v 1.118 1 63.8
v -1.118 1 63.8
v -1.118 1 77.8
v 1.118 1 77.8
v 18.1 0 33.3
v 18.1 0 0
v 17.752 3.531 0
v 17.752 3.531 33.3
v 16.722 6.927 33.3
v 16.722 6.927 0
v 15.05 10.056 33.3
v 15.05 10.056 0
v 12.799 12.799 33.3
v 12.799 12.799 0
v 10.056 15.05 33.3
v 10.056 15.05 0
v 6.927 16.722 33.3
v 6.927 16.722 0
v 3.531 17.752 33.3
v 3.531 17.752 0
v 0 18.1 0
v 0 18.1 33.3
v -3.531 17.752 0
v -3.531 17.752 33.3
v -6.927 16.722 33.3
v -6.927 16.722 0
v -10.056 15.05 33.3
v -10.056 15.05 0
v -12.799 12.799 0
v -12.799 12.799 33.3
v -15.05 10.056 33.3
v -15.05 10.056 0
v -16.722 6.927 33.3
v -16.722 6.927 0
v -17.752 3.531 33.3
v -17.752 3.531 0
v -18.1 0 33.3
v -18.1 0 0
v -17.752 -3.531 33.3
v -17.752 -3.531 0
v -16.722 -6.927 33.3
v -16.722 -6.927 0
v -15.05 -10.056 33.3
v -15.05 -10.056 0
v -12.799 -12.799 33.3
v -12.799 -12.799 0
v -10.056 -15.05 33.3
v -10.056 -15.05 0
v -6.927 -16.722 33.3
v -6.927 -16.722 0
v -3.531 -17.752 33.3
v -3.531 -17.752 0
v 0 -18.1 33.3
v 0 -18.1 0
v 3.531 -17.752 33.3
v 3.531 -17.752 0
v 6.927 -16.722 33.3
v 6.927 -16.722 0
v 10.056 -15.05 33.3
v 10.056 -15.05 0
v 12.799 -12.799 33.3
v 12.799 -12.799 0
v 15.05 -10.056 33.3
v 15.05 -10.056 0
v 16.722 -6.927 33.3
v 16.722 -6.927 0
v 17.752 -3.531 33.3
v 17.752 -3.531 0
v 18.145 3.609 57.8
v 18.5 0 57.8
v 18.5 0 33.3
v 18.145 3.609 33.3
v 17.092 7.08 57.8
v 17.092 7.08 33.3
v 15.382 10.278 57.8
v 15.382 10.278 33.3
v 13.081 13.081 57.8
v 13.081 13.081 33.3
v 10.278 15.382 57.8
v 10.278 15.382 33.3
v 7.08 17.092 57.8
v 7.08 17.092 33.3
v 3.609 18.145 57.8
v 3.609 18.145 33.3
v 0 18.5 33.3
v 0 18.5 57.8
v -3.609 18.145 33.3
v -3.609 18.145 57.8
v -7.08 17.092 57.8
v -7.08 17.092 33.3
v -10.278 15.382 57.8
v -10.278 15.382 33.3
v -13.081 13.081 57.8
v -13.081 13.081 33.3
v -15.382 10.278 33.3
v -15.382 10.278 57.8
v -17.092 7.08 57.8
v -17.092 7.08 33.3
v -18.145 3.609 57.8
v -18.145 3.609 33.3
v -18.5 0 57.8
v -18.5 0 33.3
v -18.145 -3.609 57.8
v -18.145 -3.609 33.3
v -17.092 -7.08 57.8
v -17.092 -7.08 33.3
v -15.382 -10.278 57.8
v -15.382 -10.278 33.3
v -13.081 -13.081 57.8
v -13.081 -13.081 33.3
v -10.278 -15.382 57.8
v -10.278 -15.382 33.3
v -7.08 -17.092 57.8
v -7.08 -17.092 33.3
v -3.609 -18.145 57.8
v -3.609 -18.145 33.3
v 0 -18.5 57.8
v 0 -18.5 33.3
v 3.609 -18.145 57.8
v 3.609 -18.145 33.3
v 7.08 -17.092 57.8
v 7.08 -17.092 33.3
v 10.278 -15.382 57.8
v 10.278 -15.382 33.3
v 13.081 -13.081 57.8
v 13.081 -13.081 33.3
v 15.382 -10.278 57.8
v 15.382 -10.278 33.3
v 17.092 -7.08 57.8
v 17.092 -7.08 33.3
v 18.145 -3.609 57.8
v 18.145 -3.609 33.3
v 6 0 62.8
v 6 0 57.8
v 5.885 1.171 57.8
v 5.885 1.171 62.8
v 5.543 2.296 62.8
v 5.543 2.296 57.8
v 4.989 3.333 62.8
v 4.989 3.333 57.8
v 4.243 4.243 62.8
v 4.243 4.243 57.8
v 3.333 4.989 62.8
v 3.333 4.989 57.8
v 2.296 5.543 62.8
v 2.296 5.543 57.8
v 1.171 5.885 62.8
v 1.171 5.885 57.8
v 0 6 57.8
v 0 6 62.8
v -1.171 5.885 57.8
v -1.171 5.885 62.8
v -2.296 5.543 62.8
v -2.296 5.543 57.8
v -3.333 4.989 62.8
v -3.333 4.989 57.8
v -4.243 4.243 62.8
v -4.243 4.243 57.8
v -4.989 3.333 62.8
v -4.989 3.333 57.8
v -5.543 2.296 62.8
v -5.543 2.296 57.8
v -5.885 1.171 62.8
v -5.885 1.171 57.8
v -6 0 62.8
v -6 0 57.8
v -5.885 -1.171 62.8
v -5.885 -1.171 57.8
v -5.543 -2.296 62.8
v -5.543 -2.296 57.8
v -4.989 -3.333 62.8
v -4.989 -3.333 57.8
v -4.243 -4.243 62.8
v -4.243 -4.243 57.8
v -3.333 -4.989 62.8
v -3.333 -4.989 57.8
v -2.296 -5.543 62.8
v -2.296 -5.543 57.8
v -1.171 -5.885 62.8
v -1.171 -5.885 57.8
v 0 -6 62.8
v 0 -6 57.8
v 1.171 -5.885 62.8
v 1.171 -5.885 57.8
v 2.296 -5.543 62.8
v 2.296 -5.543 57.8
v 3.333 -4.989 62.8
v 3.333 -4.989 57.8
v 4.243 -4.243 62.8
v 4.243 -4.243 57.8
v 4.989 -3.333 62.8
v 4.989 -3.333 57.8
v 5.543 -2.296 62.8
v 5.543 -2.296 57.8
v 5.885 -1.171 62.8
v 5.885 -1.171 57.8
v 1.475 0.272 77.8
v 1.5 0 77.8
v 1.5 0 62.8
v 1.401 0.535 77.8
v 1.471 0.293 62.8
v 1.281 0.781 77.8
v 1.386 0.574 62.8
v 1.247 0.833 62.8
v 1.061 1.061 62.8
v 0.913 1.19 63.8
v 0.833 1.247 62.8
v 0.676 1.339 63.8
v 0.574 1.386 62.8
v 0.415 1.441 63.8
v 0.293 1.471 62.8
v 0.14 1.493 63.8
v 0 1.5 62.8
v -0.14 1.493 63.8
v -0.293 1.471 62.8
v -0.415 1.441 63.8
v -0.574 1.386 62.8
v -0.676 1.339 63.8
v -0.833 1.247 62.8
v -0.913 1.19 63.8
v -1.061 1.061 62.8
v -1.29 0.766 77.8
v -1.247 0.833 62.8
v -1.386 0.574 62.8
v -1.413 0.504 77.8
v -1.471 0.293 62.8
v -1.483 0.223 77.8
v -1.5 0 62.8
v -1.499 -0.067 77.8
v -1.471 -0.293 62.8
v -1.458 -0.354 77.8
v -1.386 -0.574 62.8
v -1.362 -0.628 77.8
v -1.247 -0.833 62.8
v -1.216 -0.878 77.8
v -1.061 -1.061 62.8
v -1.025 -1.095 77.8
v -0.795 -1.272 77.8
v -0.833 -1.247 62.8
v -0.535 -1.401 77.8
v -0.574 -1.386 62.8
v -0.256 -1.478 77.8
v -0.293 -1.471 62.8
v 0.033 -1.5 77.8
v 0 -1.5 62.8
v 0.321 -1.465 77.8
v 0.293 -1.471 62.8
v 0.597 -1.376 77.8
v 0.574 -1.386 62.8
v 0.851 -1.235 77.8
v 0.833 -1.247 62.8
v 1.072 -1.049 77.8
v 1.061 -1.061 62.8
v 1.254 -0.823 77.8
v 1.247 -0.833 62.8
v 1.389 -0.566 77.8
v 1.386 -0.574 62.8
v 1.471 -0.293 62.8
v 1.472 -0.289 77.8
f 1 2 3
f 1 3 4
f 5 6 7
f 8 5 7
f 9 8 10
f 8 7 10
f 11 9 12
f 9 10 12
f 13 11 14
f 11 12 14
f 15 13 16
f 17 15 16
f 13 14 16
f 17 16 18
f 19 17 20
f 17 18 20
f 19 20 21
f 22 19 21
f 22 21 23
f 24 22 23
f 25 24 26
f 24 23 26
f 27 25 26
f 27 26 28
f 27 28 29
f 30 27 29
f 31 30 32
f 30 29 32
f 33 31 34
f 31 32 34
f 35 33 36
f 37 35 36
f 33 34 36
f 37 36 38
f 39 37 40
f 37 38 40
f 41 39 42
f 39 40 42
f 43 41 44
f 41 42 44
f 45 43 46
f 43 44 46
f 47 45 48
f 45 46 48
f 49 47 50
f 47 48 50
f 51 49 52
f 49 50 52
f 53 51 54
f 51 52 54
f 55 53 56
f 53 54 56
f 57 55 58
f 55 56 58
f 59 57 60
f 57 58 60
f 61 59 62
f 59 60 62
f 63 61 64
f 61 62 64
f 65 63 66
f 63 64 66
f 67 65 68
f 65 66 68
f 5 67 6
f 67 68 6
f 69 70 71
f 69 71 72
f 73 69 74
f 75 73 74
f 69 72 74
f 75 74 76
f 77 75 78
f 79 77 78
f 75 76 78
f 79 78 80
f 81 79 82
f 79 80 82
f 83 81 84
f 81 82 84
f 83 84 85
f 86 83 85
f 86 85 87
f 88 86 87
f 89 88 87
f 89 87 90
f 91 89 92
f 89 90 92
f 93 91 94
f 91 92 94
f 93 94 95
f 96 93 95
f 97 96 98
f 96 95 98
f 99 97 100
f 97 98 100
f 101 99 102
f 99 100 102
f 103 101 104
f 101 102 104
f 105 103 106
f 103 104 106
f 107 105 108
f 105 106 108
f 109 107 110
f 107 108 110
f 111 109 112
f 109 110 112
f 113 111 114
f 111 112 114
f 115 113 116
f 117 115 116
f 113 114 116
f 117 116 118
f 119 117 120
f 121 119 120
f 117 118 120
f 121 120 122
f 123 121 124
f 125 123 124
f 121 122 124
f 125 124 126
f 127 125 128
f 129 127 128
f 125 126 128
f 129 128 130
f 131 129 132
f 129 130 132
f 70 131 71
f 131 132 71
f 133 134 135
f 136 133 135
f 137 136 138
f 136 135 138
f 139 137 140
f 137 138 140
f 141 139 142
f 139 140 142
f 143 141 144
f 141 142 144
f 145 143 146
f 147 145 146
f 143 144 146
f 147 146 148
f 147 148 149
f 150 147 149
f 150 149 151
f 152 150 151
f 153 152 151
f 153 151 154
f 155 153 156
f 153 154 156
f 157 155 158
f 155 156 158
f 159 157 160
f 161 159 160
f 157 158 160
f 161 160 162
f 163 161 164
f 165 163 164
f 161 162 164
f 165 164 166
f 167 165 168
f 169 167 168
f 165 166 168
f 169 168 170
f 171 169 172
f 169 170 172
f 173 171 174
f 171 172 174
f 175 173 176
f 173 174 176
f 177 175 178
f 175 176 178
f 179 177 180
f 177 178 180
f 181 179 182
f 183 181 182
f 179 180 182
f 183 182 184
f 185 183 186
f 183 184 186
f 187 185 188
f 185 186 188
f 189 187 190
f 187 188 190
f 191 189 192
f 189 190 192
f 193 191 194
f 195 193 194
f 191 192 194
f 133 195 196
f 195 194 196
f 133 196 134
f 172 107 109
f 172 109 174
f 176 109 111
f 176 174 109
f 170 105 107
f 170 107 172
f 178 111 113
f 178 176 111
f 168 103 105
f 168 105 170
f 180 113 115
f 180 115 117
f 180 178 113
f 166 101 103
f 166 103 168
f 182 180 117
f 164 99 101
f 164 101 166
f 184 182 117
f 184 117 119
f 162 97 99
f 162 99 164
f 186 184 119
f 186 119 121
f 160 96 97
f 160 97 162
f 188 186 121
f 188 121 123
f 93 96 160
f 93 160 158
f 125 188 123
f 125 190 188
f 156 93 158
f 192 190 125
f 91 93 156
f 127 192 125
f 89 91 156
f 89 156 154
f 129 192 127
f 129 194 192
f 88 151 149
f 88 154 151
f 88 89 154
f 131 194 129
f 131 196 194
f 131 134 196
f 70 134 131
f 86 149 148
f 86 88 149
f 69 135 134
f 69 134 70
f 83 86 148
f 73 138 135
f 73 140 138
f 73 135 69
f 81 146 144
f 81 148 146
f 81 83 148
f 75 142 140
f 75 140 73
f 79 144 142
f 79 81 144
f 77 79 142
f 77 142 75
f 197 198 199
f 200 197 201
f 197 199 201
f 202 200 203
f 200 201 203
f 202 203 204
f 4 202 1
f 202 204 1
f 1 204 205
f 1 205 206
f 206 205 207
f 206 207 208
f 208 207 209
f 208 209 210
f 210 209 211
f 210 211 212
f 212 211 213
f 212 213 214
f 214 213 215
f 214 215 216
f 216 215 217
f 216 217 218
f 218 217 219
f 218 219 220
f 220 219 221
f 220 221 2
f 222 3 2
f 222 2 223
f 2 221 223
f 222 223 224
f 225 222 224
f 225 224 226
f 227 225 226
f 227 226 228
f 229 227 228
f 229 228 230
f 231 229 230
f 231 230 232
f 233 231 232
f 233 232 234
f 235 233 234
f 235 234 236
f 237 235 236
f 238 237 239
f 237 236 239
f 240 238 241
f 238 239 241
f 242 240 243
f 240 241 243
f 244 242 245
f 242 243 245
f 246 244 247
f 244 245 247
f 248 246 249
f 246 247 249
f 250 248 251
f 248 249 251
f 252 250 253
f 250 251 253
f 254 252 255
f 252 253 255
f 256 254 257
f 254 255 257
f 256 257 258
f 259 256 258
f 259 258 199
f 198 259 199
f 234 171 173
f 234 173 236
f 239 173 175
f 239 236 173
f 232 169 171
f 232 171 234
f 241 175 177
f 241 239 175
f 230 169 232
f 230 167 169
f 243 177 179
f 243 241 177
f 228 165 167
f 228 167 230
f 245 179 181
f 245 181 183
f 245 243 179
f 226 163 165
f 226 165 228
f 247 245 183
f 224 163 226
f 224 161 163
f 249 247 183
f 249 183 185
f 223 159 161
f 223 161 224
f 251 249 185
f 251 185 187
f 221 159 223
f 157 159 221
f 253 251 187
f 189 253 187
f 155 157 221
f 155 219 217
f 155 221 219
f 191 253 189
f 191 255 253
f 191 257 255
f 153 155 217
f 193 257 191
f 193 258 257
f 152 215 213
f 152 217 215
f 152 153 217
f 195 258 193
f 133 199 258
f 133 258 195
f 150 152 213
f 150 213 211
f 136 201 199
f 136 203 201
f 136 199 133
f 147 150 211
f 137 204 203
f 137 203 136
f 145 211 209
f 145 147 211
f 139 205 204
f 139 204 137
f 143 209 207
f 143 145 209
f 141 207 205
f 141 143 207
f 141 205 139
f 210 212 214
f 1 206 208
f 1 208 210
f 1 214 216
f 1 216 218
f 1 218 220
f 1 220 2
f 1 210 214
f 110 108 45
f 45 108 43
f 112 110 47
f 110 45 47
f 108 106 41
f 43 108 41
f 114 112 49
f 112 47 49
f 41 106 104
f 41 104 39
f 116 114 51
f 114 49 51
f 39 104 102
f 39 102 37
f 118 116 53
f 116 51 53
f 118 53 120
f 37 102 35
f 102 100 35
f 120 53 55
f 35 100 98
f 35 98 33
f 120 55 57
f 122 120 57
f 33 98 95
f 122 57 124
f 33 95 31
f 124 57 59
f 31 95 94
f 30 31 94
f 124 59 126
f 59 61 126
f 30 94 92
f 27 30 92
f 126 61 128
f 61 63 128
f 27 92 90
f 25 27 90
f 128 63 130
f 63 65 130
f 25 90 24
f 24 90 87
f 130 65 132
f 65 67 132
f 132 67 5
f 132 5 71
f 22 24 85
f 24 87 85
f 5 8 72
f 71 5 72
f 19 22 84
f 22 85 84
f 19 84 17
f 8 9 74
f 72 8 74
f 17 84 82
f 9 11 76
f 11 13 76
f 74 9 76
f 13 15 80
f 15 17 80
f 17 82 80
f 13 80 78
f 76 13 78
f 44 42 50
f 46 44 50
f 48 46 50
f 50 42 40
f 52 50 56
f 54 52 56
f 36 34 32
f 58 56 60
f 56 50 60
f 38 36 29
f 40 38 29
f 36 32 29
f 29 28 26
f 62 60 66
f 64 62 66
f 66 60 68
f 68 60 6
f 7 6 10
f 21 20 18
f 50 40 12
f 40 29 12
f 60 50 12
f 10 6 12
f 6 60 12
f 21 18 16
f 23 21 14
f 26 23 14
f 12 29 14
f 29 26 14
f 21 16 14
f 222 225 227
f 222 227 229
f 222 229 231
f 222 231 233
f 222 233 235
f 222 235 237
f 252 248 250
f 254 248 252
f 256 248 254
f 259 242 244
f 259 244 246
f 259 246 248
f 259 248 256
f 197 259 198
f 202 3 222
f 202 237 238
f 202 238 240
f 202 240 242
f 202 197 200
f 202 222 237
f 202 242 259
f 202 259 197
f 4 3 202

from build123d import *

# Parameters (mm, degrees)
SKETCH1_R           = 18.099999995
BOSS_EXTRUDE1_DEPTH = 33.3
SKETCH2_R           = 18.5
BOSS_EXTRUDE2_DEPTH = 24.5
SKETCH3_R           = 5.999999938
BOSS_EXTRUDE3_DEPTH = 5
SKETCH4_R           = 1.500000048
BOSS_EXTRUDE4_DEPTH = 15
CUT_EXTRUDE2_START  = -14
CUT_EXTRUDE2_DEPTH  = 14


with BuildPart() as part:
    # Sketch1 → Boss-Extrude1 (new body)
    with BuildSketch(Plane.XY):
        Circle(SKETCH1_R)
    extrude(amount=BOSS_EXTRUDE1_DEPTH)

    # Sketch2 → Boss-Extrude2 (add)
    with BuildSketch(Plane.XY.offset(33.3)):
        Circle(SKETCH2_R)
    extrude(amount=BOSS_EXTRUDE2_DEPTH)

    # Sketch3 → Boss-Extrude3 (add)
    with BuildSketch(Plane.XY.offset(57.8)):
        Circle(SKETCH3_R)
    extrude(amount=BOSS_EXTRUDE3_DEPTH)

    # Sketch4 → Boss-Extrude4 (add)
    with BuildSketch(Plane.XY.offset(62.8)):
        Circle(SKETCH4_R)
    extrude(amount=BOSS_EXTRUDE4_DEPTH)

    # Sketch8 → Cut-Extrude2 (cut)
    with BuildSketch(Plane.XY.offset(77.8).offset(CUT_EXTRUDE2_START)):
        with BuildLine():
            Line((-1.118034025, 1.000000032), (1.118034025, 1.000000032))
            ThreePointArc((1.118034025, 1.000000032), (0, 1.500000048), (-1.118034025, 1.000000032))
        make_face()
    extrude(amount=CUT_EXTRUDE2_DEPTH, mode=Mode.SUBTRACT)


solid = part.part
